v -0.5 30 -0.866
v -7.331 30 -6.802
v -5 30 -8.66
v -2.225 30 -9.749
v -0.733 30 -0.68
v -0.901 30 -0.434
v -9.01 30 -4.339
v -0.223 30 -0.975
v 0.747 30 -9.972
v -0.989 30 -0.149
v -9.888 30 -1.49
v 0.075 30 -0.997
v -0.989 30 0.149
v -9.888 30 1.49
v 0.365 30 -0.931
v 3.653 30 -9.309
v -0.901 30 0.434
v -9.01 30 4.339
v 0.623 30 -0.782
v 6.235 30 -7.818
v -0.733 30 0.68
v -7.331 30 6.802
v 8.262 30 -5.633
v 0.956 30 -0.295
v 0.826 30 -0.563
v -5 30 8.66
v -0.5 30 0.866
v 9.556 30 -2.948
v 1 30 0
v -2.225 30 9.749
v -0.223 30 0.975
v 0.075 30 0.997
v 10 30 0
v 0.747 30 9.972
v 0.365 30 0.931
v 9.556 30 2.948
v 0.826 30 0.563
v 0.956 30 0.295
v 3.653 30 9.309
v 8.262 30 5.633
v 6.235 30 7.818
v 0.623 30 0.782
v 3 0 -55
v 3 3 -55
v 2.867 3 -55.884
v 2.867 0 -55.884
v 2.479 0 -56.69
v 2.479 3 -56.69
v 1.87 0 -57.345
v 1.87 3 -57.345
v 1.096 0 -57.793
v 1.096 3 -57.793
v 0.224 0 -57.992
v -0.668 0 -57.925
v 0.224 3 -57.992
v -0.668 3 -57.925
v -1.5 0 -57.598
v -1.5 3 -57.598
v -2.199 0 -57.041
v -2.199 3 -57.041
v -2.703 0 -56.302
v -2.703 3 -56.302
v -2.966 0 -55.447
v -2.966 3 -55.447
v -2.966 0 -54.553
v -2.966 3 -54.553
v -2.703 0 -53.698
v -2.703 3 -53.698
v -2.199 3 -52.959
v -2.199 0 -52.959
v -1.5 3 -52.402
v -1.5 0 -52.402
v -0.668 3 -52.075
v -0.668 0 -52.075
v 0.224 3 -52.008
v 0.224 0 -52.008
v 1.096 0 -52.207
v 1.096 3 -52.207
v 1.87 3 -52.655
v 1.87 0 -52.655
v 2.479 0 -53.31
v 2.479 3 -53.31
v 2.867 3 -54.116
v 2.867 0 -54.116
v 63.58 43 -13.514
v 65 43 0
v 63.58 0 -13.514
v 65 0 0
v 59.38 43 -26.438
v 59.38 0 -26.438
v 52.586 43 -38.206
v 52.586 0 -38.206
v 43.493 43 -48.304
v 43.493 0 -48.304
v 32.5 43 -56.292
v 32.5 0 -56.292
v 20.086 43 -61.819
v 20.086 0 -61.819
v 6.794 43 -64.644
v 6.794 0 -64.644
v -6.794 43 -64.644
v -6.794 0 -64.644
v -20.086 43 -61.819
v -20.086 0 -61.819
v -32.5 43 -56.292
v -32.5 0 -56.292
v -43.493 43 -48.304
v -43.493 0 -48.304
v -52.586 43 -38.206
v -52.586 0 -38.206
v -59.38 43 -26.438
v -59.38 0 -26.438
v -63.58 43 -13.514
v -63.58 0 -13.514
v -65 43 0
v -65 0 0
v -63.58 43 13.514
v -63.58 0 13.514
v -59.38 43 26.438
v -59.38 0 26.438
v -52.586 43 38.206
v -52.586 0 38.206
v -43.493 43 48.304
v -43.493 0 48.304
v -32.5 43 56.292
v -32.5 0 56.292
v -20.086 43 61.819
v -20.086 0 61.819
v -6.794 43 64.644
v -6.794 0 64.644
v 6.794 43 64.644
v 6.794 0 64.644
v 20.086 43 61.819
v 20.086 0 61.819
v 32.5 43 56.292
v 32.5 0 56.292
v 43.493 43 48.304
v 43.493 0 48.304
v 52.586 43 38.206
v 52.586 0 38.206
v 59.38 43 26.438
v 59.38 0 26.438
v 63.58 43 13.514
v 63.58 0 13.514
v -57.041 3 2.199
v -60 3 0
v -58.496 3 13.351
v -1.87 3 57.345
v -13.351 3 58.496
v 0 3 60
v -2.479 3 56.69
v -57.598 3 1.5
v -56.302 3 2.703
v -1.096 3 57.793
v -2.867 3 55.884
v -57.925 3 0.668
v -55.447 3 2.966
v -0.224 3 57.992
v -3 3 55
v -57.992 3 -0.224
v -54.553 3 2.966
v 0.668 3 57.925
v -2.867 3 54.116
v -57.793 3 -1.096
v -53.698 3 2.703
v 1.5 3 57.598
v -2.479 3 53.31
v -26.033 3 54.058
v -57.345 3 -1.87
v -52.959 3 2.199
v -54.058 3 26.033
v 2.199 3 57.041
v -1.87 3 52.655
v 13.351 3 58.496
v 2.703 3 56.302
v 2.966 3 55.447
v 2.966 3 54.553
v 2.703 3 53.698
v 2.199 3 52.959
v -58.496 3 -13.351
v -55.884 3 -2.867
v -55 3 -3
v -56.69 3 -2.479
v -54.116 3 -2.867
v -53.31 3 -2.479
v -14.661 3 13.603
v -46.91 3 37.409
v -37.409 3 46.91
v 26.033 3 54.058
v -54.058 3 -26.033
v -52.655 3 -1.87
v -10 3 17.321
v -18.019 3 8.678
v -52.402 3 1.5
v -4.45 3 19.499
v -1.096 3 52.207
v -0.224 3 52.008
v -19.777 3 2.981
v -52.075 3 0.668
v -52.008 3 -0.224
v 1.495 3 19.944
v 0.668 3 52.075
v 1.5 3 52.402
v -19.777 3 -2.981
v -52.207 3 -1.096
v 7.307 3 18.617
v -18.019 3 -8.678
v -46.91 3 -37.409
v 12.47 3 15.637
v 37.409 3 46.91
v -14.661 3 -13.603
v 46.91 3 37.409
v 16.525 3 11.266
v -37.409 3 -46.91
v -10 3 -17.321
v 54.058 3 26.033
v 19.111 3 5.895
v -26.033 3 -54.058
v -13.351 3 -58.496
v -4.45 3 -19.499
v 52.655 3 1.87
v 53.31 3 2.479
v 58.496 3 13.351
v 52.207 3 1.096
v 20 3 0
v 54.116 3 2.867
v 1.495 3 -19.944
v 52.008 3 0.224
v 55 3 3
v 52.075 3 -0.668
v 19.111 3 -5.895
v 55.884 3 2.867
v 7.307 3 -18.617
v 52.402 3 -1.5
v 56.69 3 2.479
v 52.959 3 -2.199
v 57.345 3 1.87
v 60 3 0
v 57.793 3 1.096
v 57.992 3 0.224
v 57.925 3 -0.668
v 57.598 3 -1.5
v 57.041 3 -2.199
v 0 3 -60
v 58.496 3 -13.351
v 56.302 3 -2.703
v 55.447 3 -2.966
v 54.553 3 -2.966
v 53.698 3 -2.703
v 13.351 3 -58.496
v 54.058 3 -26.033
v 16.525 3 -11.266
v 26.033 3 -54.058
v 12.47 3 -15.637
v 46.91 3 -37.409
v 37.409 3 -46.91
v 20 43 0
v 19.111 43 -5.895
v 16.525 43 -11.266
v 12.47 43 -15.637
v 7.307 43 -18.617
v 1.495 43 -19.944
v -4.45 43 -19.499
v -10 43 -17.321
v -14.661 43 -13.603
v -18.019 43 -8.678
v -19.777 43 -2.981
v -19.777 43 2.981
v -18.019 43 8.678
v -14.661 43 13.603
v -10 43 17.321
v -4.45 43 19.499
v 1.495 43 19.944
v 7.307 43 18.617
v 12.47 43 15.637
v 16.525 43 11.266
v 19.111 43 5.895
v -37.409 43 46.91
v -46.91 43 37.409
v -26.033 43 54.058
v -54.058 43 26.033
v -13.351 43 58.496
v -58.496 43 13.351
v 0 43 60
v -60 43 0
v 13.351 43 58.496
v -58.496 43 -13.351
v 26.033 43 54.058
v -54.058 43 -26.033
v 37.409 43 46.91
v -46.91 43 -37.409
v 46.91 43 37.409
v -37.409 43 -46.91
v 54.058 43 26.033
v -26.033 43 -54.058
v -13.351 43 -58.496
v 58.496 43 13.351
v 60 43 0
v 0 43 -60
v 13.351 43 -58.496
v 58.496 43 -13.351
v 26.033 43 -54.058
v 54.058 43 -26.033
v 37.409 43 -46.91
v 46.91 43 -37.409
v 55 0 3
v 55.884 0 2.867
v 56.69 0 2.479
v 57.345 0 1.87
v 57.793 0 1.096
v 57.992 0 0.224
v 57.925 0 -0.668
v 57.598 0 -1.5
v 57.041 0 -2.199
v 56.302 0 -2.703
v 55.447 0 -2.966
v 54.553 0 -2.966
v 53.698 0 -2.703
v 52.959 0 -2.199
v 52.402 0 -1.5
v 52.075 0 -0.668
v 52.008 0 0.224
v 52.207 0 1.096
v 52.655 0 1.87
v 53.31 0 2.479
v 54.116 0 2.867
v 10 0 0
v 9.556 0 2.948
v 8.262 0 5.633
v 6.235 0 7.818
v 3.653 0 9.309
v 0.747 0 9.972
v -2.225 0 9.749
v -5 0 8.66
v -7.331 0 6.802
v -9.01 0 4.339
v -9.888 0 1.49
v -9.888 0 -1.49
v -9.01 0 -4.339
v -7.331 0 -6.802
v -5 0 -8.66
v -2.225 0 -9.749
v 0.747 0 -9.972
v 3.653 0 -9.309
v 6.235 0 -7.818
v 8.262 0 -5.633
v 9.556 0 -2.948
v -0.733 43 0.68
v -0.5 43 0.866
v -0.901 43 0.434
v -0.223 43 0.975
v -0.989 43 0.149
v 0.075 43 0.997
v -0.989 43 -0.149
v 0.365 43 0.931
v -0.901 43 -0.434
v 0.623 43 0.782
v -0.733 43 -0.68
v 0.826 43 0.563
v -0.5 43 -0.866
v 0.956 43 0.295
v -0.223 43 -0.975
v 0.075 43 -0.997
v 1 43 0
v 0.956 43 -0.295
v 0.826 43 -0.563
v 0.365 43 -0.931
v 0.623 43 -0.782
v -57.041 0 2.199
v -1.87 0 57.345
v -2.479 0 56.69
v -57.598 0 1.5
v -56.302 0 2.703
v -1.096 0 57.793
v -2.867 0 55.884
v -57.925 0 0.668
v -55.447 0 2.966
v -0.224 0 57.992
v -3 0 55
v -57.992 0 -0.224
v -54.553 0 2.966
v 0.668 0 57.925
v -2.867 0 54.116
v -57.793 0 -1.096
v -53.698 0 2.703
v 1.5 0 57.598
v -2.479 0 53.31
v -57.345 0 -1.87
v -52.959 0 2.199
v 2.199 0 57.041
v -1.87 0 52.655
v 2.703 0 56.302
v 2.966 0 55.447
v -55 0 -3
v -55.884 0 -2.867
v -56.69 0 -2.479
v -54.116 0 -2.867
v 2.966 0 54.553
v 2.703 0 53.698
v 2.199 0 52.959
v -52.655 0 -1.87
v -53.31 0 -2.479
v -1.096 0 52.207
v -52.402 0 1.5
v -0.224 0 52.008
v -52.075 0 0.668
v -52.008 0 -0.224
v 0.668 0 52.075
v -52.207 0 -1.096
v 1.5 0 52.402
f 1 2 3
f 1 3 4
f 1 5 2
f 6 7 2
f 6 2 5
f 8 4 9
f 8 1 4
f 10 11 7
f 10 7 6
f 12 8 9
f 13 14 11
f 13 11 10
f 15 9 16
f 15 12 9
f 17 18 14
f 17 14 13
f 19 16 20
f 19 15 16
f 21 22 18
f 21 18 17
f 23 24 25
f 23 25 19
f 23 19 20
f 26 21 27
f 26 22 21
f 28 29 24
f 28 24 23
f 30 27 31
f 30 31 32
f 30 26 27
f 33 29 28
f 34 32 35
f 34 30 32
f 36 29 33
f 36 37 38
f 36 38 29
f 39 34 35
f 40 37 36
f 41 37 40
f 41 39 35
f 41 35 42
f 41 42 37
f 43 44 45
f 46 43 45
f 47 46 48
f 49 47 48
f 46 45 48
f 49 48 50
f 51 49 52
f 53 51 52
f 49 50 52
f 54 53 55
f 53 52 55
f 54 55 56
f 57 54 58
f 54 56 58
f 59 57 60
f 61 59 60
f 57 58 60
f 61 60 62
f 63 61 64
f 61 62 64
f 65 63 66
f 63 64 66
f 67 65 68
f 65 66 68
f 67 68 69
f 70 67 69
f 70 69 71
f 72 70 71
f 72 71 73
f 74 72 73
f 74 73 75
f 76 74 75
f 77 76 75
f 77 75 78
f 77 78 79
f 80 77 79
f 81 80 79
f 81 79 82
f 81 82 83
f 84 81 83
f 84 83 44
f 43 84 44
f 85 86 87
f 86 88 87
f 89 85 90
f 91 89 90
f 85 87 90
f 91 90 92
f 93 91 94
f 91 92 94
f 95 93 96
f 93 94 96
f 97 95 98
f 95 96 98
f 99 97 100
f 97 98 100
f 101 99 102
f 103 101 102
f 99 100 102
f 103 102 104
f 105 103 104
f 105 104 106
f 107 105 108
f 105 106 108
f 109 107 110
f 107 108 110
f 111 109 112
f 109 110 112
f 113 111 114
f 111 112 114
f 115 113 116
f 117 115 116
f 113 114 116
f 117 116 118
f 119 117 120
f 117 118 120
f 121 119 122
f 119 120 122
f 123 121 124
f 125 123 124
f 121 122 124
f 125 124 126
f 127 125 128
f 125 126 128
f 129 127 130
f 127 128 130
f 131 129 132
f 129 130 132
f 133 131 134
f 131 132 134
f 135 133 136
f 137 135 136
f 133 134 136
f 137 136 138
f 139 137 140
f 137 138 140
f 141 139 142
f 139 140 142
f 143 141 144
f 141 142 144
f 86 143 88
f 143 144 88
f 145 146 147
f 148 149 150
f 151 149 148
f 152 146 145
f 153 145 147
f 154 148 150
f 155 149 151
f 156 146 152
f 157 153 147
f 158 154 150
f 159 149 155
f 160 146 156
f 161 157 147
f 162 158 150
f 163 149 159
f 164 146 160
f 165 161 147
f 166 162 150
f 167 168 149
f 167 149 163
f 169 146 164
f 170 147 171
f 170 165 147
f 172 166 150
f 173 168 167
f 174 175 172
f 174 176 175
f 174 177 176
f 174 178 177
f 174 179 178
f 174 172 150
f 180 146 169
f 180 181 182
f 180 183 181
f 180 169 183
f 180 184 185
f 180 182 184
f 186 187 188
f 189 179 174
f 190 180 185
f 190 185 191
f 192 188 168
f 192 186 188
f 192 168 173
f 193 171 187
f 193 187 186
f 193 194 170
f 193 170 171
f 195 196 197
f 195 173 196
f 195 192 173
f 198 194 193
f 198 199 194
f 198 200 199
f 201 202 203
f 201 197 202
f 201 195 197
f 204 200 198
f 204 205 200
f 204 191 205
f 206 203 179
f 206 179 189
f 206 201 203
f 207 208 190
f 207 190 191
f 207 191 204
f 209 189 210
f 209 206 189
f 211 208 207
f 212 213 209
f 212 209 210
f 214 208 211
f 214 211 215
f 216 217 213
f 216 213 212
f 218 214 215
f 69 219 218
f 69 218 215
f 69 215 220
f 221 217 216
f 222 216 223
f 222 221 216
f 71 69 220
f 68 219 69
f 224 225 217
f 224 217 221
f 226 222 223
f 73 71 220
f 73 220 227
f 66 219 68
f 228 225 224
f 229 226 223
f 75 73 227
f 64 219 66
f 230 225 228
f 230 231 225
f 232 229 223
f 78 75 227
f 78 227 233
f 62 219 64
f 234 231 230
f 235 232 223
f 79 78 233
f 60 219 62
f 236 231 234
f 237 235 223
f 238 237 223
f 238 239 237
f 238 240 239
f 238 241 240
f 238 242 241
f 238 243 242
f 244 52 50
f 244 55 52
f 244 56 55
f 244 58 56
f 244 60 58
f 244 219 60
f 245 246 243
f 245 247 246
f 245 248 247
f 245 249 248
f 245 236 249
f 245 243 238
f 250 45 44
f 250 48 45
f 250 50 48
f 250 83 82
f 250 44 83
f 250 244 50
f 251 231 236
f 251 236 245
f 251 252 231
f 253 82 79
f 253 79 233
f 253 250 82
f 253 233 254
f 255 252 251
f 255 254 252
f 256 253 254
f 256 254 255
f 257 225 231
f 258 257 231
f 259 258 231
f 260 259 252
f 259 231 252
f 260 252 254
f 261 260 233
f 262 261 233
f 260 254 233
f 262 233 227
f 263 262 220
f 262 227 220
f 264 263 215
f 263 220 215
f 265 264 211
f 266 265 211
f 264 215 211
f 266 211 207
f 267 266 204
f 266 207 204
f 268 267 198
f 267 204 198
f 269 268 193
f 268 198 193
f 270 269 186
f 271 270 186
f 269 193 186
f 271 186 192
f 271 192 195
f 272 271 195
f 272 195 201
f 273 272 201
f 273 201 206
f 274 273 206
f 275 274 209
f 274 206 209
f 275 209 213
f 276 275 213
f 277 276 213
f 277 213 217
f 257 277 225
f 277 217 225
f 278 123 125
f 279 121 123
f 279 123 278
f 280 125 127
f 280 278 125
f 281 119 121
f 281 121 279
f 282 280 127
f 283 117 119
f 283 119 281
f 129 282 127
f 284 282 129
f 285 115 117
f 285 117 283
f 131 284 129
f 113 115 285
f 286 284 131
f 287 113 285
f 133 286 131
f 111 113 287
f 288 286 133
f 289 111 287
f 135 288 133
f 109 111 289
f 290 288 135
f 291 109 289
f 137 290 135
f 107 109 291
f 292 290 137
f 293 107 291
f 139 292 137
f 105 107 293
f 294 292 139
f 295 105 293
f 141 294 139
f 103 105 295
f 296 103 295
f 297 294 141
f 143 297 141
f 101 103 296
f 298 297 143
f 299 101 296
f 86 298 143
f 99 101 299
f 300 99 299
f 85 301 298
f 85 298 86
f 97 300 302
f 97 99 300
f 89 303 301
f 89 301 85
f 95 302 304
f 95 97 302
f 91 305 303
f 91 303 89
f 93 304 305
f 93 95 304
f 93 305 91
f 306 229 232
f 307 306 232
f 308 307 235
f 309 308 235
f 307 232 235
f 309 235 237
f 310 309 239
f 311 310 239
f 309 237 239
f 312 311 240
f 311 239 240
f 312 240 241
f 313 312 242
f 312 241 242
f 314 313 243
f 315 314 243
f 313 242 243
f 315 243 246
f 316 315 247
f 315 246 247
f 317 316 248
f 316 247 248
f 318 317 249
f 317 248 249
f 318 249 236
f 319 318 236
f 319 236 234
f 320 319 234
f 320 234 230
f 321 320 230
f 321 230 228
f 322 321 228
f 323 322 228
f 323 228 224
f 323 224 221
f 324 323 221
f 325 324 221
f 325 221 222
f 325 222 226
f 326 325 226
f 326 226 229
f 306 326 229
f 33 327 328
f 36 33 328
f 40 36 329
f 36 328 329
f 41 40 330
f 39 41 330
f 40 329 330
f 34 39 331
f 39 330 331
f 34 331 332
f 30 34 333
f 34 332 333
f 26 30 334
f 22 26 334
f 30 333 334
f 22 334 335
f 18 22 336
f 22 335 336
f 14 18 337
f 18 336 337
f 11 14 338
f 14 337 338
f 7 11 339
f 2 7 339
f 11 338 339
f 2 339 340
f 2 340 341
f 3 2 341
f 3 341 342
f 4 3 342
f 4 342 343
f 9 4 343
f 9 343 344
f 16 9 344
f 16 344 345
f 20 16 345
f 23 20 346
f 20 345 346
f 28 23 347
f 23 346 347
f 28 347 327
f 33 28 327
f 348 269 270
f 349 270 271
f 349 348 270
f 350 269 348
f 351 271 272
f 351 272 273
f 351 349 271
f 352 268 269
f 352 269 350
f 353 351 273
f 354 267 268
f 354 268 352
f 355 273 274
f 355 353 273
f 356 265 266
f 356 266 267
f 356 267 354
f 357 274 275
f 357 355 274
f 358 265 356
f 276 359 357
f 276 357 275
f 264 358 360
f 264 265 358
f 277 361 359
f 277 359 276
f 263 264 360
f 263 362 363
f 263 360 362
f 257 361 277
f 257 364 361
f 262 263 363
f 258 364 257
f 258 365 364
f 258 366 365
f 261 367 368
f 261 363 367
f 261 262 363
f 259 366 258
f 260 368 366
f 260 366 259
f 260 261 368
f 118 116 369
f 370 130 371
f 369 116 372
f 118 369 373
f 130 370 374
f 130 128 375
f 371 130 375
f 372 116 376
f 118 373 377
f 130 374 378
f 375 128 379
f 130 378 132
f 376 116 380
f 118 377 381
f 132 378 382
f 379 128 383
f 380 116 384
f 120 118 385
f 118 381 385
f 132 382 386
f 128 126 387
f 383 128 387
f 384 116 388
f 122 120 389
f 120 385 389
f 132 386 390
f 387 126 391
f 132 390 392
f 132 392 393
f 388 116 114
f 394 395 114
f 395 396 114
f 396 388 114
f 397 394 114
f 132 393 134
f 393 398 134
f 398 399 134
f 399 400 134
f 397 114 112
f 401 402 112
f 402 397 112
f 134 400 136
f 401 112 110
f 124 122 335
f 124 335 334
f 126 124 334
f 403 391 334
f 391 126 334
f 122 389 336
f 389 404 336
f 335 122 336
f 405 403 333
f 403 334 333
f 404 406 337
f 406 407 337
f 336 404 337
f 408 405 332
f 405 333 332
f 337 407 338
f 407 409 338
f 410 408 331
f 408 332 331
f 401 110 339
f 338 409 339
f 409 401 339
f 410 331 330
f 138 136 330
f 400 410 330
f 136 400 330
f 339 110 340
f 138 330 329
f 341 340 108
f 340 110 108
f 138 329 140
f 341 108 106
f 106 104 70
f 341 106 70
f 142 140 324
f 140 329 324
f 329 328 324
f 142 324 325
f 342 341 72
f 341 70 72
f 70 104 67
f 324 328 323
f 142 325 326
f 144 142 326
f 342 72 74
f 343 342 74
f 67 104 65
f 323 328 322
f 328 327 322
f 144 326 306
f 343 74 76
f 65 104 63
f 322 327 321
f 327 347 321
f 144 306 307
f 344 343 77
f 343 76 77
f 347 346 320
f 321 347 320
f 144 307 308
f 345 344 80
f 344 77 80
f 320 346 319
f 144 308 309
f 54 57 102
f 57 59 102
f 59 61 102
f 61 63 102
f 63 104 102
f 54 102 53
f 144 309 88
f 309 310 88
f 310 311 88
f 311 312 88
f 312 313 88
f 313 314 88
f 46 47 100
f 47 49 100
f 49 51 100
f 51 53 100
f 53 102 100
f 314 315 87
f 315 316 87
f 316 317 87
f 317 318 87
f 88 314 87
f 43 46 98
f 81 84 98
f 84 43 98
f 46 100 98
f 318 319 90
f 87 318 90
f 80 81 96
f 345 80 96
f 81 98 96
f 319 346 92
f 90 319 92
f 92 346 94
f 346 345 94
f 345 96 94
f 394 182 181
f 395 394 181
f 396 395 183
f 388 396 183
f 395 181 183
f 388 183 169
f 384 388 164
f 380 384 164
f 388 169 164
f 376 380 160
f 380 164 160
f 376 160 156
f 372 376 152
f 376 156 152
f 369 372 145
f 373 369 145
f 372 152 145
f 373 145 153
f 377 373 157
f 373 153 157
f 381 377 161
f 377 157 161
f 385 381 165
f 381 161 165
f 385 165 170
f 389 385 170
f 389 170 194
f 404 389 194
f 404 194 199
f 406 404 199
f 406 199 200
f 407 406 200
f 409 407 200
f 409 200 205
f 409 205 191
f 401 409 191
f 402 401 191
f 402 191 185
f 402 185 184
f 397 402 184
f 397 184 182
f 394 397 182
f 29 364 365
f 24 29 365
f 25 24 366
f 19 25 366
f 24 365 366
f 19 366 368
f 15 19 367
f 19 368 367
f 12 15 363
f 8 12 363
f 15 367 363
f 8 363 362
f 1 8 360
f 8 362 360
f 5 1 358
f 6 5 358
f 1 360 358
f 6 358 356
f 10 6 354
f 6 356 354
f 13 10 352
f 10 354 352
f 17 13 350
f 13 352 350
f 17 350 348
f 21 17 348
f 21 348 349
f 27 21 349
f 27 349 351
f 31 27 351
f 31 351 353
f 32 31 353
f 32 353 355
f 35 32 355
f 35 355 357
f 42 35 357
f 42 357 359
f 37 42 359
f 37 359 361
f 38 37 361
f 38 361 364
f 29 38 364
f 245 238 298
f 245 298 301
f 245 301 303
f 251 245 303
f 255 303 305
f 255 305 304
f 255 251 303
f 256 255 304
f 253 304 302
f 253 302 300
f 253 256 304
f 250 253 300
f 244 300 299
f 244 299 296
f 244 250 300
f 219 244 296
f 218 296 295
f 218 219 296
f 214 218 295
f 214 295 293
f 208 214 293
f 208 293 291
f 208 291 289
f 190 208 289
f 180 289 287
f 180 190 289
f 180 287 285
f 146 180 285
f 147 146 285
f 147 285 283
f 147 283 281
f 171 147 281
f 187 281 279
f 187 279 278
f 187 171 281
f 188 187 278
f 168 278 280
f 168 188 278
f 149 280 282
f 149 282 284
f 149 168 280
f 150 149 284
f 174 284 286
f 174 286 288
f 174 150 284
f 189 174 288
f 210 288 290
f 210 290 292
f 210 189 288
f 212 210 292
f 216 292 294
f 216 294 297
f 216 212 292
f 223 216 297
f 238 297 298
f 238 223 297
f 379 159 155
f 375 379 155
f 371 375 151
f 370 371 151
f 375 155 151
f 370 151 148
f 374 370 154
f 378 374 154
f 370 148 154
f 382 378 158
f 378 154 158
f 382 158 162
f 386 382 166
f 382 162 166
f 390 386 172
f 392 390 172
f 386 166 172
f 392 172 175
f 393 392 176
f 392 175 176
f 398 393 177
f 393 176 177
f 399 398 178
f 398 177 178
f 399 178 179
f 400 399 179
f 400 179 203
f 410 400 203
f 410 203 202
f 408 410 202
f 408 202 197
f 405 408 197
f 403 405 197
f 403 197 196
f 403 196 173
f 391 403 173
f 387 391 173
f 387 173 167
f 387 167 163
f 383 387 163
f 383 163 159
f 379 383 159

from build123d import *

# Parameters (mm, degrees)
SKETCH1_R           = 65
BOSS_EXTRUDE1_DEPTH = 3
SKETCH2_R           = 3
CUT_EXTRUDE1_DEPTH  = 4
CIRPATTERN1_COUNT   = 4
SKETCH3_R           = 65
SKETCH3_R_2         = 60
BOSS_EXTRUDE2_DEPTH = 40
SKETCH4_R           = 20
BOSS_EXTRUDE3_DEPTH = 40
SKETCH5_R           = 10
CUT_EXTRUDE2_DEPTH  = 30
SKETCH6_R           = 1
CUT_EXTRUDE3_DEPTH  = 44


with BuildPart() as part:
    # Sketch1 → Boss-Extrude1 (new body)
    with BuildSketch(Plane(origin=(0, 0, 0), x_dir=(1, 0, 0), z_dir=(0, 1, 0))):
        Circle(SKETCH1_R)
    extrude(amount=BOSS_EXTRUDE1_DEPTH)

    # Sketch2 → Cut-Extrude1 (cut, through all)
    with BuildSketch(Plane(origin=(0, 3, 0), x_dir=(1, 0, 0), z_dir=(0, 1, 0))):
        with Locations((0, 55)):
            Circle(SKETCH2_R)
    cut_extrude1 = extrude(amount=-CUT_EXTRUDE1_DEPTH, mode=Mode.SUBTRACT)

    # CirPattern1: Cut-Extrude1 ×4 about axis
    cirpattern1_axis = Axis((0, 0, 0), (0, 1, 0))
    for i in range(1, CIRPATTERN1_COUNT):
        add(cut_extrude1.rotate(cirpattern1_axis, i * 360 / CIRPATTERN1_COUNT), mode=Mode.SUBTRACT)

    # Sketch3 → Boss-Extrude2 (add)
    with BuildSketch(Plane(origin=(0, 3, 0), x_dir=(1, 0, 0), z_dir=(0, 1, 0))):
        Circle(SKETCH3_R)
        Circle(SKETCH3_R_2, mode=Mode.SUBTRACT)
    extrude(amount=BOSS_EXTRUDE2_DEPTH)

    # Sketch4 → Boss-Extrude3 (add)
    with BuildSketch(Plane(origin=(0, 3, 0), x_dir=(1, 0, 0), z_dir=(0, 1, 0))):
        Circle(SKETCH4_R)
    extrude(amount=BOSS_EXTRUDE3_DEPTH)

    # Sketch5 → Cut-Extrude2 (cut)
    with BuildSketch(Plane.XZ):
        Circle(SKETCH5_R)
    extrude(amount=-CUT_EXTRUDE2_DEPTH, mode=Mode.SUBTRACT)

    # Sketch6 → Cut-Extrude3 (cut, through all)
    with BuildSketch(Plane(origin=(0, 43, 0), x_dir=(1, 0, 0), z_dir=(0, 1, 0))):
        Circle(SKETCH6_R)
    extrude(amount=-CUT_EXTRUDE3_DEPTH, mode=Mode.SUBTRACT)


solid = part.part
